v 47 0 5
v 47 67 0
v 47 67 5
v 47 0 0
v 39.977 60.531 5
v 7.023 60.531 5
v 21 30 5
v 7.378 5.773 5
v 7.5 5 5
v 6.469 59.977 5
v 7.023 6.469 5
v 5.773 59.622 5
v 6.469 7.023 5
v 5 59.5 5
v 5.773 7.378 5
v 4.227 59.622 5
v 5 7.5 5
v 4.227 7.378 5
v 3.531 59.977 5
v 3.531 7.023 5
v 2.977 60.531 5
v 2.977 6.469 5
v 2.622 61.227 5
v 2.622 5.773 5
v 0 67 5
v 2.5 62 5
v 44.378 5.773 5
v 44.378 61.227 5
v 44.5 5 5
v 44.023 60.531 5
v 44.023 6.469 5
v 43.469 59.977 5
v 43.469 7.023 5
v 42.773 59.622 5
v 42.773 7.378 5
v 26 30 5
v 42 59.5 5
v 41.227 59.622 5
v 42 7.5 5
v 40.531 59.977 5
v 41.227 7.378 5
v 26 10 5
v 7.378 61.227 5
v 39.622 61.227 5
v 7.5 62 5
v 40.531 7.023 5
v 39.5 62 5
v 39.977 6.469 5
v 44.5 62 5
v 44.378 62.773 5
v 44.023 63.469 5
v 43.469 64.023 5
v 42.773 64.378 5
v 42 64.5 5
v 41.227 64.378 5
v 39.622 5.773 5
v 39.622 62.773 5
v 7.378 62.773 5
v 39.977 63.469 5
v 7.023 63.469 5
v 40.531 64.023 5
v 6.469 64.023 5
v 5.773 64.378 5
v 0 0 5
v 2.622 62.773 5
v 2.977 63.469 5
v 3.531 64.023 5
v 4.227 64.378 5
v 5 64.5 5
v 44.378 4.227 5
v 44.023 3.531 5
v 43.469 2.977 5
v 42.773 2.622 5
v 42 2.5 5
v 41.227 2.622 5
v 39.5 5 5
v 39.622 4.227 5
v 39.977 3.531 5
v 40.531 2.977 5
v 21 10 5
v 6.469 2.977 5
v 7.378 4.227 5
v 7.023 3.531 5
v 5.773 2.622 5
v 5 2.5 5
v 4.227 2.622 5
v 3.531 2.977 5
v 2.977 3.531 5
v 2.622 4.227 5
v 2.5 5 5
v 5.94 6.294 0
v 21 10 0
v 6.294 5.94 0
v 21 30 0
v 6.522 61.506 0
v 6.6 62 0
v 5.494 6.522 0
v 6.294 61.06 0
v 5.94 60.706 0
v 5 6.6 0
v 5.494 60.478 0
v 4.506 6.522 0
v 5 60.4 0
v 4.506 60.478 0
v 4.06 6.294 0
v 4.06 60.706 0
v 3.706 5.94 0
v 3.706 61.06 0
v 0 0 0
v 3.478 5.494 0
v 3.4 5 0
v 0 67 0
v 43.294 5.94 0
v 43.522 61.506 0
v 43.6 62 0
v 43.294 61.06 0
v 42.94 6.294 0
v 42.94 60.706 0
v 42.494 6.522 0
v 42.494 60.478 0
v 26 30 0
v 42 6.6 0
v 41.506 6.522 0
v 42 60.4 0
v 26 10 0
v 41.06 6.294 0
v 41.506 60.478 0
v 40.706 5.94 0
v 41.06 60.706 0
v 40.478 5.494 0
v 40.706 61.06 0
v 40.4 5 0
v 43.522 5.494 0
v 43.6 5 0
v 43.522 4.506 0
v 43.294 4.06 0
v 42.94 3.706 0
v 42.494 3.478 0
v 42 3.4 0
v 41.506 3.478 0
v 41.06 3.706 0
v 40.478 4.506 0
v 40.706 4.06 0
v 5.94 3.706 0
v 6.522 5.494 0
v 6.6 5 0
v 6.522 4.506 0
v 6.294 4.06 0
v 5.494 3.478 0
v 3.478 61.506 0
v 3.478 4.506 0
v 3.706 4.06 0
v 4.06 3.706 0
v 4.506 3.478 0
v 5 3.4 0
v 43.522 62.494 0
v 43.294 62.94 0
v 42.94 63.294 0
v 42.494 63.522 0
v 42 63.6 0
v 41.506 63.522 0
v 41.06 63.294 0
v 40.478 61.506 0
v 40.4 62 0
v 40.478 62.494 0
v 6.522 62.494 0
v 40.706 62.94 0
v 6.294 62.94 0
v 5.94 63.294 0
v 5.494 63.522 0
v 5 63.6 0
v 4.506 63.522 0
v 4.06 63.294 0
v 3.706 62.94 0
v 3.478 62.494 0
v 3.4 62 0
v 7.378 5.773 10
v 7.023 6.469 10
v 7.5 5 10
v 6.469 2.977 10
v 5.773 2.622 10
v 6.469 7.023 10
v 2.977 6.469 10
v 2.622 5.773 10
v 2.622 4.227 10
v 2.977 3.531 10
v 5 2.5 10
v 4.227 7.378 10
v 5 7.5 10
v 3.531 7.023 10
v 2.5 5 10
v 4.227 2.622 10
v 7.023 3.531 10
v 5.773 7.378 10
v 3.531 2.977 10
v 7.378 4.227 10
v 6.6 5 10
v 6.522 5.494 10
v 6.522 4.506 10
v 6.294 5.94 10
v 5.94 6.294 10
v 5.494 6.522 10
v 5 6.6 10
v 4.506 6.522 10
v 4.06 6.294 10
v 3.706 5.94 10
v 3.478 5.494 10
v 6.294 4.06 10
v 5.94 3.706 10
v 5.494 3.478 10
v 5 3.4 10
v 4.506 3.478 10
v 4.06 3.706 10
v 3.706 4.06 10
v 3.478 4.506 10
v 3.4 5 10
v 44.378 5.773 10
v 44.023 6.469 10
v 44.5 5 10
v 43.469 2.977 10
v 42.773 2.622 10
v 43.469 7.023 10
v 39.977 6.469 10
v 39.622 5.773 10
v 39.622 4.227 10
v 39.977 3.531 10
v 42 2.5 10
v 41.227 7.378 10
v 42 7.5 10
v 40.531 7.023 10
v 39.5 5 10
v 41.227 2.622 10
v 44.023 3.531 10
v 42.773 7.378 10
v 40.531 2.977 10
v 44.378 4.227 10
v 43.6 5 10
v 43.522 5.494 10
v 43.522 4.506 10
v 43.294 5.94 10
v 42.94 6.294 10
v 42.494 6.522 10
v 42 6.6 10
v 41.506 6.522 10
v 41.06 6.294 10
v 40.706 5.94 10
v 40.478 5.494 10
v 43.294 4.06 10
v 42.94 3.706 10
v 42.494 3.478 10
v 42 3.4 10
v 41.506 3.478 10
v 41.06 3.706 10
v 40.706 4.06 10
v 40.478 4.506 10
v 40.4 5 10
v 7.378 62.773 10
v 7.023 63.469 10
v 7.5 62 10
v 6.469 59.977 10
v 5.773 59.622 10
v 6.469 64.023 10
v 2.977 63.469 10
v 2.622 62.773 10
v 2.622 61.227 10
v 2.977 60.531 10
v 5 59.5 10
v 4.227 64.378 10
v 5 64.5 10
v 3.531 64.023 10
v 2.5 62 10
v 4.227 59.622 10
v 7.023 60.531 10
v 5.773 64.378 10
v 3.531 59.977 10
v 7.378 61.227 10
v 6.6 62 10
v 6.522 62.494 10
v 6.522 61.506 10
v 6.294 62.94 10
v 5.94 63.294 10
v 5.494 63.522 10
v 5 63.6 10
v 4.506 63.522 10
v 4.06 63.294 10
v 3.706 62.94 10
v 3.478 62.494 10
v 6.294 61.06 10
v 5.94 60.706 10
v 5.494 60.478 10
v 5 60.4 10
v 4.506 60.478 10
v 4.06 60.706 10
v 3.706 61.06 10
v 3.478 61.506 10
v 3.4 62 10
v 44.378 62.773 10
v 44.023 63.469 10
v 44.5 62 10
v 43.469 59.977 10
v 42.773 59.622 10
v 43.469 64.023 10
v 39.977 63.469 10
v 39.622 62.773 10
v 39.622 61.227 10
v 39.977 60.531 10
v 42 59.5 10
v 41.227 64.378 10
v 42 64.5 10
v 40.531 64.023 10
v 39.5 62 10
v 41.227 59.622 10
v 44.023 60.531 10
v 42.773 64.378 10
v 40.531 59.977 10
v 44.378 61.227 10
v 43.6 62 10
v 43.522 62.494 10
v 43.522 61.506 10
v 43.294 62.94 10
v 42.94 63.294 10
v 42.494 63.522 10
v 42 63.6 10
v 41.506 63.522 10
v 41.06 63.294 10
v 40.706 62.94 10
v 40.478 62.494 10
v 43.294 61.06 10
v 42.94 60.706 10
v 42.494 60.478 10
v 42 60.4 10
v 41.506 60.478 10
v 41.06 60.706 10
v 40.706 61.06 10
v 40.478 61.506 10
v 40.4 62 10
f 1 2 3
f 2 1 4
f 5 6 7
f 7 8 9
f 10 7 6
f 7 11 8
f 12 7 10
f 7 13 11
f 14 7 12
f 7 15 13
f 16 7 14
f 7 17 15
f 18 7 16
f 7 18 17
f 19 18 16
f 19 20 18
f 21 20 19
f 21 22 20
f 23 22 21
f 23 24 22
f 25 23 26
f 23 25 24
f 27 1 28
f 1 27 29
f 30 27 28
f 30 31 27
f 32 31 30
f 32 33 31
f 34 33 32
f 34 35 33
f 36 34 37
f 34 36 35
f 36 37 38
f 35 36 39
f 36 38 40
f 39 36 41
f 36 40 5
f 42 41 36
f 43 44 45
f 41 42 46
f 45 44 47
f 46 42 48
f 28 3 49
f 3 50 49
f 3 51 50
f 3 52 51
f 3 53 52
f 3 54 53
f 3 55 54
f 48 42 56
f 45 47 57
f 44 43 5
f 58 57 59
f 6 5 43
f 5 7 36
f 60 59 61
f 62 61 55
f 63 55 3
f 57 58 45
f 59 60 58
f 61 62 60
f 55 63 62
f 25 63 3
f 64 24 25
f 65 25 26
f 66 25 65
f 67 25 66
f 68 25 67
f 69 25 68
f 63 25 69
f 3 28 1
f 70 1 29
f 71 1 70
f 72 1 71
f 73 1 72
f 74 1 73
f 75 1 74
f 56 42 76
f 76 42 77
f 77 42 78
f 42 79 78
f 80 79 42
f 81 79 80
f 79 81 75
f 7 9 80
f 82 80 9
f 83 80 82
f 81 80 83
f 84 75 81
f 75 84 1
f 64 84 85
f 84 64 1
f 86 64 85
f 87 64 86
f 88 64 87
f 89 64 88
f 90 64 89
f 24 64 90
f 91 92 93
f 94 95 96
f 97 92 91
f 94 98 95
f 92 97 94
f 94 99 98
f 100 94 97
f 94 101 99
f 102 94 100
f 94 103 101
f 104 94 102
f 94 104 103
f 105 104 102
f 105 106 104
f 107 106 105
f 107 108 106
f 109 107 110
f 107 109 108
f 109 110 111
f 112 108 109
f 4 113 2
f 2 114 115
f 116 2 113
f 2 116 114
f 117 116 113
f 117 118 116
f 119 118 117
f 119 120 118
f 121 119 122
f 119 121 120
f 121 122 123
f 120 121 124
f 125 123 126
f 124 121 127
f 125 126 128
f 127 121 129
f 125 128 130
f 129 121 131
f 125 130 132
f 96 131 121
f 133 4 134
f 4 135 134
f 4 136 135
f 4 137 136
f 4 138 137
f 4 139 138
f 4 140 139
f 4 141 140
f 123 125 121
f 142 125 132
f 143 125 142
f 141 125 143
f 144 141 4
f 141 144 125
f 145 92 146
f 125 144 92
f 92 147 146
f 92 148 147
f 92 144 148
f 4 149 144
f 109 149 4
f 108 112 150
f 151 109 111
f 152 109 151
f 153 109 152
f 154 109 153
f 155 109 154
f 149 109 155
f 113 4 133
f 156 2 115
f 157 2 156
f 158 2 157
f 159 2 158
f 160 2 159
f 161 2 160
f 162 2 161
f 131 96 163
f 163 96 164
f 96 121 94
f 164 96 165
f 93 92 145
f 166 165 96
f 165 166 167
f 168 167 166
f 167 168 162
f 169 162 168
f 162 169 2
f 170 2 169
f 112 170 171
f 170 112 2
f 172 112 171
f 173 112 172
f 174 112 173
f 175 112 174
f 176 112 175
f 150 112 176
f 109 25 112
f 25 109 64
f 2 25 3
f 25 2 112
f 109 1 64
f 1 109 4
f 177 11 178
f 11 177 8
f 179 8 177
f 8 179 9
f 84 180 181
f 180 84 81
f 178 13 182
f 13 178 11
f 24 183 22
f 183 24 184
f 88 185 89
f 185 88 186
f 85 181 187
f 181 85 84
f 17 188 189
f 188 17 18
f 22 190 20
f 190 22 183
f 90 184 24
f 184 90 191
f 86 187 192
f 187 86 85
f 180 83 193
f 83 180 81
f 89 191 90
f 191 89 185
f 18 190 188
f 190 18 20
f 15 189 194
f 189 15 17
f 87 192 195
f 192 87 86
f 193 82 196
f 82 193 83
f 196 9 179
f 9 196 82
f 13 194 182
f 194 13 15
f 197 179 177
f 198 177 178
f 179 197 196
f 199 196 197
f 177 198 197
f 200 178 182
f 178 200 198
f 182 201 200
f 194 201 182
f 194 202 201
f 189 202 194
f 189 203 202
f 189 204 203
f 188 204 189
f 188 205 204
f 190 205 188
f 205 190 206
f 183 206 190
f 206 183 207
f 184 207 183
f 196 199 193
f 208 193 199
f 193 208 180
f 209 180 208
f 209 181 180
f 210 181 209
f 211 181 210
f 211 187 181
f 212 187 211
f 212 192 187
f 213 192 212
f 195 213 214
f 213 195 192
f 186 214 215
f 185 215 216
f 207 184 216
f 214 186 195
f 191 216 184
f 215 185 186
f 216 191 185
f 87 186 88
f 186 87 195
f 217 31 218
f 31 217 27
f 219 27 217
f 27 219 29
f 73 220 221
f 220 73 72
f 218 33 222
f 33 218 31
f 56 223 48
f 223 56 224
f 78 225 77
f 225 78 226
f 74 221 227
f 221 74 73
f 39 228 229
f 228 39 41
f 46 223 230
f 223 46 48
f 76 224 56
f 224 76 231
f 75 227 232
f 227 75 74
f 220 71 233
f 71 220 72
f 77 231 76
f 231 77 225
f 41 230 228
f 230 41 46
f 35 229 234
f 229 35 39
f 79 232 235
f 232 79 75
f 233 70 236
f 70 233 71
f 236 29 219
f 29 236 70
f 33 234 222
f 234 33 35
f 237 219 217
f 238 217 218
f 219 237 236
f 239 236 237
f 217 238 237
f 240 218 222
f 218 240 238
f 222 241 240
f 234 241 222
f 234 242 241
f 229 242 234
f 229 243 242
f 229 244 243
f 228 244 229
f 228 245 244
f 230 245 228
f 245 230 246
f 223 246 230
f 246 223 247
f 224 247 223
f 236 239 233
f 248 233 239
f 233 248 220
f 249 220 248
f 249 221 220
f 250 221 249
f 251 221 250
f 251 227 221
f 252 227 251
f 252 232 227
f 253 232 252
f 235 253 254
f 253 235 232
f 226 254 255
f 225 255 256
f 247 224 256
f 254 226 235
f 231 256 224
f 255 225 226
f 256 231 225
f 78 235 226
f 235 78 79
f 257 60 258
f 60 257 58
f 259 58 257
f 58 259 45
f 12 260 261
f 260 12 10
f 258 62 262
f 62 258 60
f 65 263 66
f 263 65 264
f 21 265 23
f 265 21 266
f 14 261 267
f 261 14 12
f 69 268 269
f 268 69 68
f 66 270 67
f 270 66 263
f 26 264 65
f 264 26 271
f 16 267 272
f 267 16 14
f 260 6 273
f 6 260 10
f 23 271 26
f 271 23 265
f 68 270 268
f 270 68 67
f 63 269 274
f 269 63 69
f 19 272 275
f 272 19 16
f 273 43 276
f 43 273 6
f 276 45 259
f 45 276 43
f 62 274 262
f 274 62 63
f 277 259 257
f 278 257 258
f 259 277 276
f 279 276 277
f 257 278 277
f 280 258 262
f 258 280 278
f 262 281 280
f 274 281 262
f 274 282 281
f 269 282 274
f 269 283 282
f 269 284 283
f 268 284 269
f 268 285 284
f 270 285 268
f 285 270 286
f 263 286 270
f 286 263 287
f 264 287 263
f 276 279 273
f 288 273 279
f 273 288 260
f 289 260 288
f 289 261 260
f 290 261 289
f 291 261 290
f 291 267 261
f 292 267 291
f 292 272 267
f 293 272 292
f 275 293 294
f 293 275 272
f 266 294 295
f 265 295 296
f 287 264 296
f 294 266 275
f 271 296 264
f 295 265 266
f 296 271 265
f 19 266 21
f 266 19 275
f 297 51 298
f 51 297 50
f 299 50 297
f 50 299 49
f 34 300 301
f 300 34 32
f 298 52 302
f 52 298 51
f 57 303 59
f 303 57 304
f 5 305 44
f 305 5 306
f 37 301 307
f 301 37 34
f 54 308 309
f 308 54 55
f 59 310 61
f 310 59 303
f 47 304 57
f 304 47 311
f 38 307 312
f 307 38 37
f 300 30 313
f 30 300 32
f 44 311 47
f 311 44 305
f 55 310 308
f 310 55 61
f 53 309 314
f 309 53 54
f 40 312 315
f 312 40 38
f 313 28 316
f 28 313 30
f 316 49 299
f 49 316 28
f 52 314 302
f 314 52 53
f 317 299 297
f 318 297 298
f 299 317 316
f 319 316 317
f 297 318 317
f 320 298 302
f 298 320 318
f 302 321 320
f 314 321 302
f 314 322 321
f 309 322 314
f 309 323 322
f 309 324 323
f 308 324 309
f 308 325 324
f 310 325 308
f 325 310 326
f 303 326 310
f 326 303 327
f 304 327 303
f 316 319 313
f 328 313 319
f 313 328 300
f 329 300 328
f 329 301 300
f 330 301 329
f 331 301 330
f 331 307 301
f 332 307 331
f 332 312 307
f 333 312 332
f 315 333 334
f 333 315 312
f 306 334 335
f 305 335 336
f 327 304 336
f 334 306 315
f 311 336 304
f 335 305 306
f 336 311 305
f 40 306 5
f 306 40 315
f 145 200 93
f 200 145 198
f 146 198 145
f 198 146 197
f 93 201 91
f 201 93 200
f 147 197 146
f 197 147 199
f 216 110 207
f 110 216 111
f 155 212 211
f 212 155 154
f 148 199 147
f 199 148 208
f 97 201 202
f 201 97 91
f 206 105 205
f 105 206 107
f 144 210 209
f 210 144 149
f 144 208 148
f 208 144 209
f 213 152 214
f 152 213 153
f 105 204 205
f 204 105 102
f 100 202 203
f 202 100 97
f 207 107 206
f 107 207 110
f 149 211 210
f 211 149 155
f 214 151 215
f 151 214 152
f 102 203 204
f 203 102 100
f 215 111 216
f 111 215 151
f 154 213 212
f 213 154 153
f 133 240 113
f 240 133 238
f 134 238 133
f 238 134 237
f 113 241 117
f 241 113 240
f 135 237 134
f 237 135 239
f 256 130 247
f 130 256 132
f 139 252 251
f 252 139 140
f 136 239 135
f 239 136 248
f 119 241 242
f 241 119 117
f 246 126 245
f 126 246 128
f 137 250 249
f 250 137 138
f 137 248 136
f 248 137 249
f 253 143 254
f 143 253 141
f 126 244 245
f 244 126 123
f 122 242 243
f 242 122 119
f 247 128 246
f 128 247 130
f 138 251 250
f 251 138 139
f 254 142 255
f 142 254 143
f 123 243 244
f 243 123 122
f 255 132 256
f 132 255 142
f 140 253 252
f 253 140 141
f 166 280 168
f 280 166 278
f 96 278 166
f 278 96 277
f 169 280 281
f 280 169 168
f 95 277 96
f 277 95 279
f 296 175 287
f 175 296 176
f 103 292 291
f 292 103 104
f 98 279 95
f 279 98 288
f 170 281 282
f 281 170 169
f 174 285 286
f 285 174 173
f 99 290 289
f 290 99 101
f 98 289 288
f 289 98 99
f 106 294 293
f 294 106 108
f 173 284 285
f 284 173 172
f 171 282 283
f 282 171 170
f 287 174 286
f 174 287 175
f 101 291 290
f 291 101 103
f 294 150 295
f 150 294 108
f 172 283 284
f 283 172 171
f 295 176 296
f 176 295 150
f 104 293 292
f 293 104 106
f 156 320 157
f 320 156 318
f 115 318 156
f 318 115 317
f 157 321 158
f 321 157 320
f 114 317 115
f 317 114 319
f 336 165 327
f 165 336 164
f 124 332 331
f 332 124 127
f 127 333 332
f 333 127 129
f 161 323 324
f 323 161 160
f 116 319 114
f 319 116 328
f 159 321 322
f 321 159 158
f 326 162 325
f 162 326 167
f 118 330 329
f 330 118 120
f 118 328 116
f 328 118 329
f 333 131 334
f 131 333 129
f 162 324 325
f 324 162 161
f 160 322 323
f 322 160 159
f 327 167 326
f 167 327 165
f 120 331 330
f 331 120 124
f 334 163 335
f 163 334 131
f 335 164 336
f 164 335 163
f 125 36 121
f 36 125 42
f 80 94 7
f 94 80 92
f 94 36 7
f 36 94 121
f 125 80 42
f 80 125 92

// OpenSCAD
hole_radius = 1.5;
spacer_radius = 2.5;
pcb_short_side = 40 - (2*hole_radius); // replace 40 with distance hole to hole (outside to outside)
pcb_long_side = 60 - (2*hole_radius); // replace 60 with distance hole to hole (outside to outside)
mount_margin = 5;

difference(){
  union() {
    cube([pcb_short_side + (mount_margin*2), pcb_long_side + (mount_margin*2), 5]);

    // spacers
    translate([mount_margin, mount_margin, 0]) cylinder(r=spacer_radius, h=10, $fn=20);
    translate([mount_margin+pcb_short_side, mount_margin, 0]) cylinder(r=spacer_radius, h=10, $fn=20);
    translate([mount_margin, mount_margin+pcb_long_side, 0]) cylinder(r=spacer_radius, h=10, $fn=20);
    translate([mount_margin+pcb_short_side, mount_margin+pcb_long_side, 0]) cylinder(r=spacer_radius, h=10, $fn=20);
  }

  // spacers
  translate([mount_margin, mount_margin, 0]) cylinder(r=hole_radius+0.1, h=10, $fn=20);
  translate([mount_margin+pcb_short_side, mount_margin, 0]) cylinder(r=hole_radius+0.1, h=10, $fn=20);
  translate([mount_margin, mount_margin+pcb_long_side, 0]) cylinder(r=hole_radius+0.1, h=10, $fn=20);
  translate([mount_margin+pcb_short_side, mount_margin+pcb_long_side, 0]) cylinder(r=hole_radius+0.1, h=10, $fn=20);

  // notch for joining to main pcb mount
  translate([(pcb_short_side - 5)/2 + mount_margin, 10, 0]) cube([5, 20, 10]);
}
